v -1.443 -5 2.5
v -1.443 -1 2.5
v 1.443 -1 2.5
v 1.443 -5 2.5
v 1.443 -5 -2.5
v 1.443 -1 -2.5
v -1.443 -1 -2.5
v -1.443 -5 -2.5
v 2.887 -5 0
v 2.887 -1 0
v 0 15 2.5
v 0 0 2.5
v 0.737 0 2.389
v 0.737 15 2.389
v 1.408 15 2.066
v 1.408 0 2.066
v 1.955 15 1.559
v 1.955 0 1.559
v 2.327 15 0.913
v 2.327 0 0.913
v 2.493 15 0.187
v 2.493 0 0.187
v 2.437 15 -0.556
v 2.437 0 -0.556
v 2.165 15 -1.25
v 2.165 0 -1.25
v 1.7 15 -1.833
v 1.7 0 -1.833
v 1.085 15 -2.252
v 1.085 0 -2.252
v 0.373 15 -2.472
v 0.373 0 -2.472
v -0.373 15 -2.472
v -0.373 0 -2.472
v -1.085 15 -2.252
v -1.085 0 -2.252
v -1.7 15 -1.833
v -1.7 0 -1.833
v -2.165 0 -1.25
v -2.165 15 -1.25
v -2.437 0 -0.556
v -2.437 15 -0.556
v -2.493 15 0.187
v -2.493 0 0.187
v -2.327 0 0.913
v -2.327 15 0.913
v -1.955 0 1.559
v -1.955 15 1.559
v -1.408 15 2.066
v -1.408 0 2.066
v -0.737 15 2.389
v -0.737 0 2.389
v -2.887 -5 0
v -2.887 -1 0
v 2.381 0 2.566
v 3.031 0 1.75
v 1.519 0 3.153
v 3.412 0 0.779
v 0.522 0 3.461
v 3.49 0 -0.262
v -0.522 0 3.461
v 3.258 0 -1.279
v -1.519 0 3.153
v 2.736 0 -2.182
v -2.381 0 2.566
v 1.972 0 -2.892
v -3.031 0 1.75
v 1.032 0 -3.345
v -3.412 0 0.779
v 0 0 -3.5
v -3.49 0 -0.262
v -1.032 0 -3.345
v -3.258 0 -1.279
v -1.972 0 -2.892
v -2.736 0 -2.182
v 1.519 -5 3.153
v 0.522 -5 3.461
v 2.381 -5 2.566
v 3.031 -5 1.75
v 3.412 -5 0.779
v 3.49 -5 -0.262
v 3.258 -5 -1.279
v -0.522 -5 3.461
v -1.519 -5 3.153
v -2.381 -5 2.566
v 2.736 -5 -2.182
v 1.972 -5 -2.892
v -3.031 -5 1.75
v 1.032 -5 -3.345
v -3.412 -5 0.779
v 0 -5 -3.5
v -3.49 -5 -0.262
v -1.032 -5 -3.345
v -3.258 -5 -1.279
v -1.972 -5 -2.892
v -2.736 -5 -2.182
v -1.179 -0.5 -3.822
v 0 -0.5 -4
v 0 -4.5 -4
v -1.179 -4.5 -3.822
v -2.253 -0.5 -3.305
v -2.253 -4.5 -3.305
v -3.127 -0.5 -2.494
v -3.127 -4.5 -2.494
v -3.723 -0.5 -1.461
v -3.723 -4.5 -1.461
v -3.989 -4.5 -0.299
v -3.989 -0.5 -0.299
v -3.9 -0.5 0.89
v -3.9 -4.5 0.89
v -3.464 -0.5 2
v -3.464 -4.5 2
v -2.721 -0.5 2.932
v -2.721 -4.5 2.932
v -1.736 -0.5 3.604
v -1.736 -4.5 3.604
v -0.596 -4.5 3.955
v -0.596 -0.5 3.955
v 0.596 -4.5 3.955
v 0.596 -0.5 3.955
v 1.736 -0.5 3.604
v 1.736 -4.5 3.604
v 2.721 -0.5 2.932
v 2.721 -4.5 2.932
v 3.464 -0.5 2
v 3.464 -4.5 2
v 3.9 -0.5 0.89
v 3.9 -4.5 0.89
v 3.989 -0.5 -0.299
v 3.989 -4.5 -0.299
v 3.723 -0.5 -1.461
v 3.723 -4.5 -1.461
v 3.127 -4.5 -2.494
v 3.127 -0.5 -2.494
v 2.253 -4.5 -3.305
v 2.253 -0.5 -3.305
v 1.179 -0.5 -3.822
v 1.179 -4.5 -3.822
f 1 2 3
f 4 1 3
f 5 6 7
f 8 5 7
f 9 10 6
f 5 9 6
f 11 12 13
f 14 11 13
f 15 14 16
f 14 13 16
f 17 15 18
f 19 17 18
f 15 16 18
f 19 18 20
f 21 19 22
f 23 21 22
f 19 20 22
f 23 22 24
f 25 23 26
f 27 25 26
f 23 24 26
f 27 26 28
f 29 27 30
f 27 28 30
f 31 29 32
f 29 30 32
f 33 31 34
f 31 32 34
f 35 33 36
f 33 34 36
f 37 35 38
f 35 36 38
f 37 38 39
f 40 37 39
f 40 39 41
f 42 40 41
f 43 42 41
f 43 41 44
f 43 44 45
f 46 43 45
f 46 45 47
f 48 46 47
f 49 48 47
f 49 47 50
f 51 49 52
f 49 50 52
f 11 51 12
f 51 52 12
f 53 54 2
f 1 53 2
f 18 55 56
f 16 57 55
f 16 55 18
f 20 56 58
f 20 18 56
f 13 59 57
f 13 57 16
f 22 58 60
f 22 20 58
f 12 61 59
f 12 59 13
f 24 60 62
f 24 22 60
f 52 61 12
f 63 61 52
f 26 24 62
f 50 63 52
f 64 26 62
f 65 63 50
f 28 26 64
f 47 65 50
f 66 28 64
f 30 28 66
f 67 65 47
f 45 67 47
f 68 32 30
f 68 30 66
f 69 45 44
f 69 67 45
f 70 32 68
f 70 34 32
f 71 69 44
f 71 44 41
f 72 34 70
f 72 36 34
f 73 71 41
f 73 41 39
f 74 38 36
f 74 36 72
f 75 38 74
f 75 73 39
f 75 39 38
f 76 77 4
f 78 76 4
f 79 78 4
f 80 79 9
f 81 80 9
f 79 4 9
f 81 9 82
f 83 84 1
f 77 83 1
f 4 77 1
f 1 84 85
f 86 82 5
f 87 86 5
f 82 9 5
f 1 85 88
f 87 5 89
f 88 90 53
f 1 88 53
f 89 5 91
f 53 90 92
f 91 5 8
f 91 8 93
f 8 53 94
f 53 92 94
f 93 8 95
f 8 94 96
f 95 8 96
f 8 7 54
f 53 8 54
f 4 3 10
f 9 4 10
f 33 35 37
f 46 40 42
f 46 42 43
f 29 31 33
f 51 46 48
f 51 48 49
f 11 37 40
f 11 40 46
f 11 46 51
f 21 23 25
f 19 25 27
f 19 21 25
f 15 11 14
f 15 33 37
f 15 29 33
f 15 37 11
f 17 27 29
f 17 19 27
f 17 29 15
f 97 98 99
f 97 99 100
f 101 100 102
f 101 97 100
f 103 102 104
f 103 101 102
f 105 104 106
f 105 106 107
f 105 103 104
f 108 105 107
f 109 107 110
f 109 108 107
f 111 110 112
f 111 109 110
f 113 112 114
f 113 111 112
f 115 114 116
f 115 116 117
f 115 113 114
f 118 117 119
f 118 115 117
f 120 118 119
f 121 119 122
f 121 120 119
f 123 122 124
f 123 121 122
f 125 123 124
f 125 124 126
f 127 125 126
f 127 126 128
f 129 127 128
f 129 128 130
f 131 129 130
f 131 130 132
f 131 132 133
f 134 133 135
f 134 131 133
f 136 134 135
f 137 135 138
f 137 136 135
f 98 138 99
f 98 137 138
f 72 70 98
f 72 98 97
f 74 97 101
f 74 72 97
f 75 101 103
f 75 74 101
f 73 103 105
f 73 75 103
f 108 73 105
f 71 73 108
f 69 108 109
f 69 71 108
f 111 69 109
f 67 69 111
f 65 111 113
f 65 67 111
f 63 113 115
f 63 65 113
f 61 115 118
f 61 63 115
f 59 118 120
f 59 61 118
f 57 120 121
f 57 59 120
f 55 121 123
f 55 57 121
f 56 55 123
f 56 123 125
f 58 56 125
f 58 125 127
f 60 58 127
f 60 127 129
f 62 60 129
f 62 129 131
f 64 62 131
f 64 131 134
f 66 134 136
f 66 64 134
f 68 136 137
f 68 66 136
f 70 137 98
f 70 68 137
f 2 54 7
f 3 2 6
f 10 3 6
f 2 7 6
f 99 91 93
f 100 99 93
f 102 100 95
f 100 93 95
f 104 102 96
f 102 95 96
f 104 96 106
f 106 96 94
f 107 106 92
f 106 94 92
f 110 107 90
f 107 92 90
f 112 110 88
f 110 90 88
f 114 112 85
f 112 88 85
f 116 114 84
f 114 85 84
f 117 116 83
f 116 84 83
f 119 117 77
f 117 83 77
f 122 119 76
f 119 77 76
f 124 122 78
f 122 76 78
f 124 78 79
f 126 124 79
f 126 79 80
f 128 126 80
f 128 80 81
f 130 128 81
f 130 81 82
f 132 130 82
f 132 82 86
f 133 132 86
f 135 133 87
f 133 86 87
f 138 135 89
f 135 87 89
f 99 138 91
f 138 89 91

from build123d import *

# Parameters (mm, degrees)
SKETCH1_R           = 2.5
BOSS_EXTRUDE1_DEPTH = 15
SKETCH3_W           = 4
SKETCH3_H           = 5
CUT_EXTRUDE1_START  = -1
CUT_EXTRUDE1_DEPTH  = 30
CHAMFER1_SIZE       = 0.5


with BuildPart() as part:
    # Sketch1 → Boss-Extrude1 (new body)
    with BuildSketch(Plane(origin=(0, 0, 0), x_dir=(1, 0, 0), z_dir=(0, 1, 0))):
        with Locations(Location((0, 0, 0), (0, 0, 270))):
            Circle(SKETCH1_R)
    extrude(amount=BOSS_EXTRUDE1_DEPTH)

    # Sketch3 → Revolve1 (revolve)
    with BuildSketch(Plane.XY, mode=Mode.PRIVATE) as revolve1_sk:
        with Locations((-2, -2.5)):
            Rectangle(SKETCH3_W, SKETCH3_H)
    revolve(revolve1_sk.sketch.rotate(Axis((0, -5, 0), (0, 1, 0)), 270), axis=Axis((0, -5, 0), (0, 1, 0)))

    # Sketch4 → Cut-Extrude1 (cut)
    with BuildSketch(Plane(origin=(0, 0, 0), x_dir=(1, 0, 0), z_dir=(0, 1, 0)).offset(CUT_EXTRUDE1_START)):
        Polygon((2.886751346, 0), (1.443375673, 2.5), (-1.443375673, 2.5), (-2.886751346, 0), (-1.443375673, -2.5), (1.443375673, -2.5), align=None)
    extrude(amount=-CUT_EXTRUDE1_DEPTH, mode=Mode.SUBTRACT)

    # Chamfer1
    chamfer1_edges = [part.edges().sort_by_distance(p)[0] for p in [
        (0, 0, 4),
        (0, -5, 4),
    ]]
    chamfer(chamfer1_edges, length=CHAMFER1_SIZE)


solid = part.part
